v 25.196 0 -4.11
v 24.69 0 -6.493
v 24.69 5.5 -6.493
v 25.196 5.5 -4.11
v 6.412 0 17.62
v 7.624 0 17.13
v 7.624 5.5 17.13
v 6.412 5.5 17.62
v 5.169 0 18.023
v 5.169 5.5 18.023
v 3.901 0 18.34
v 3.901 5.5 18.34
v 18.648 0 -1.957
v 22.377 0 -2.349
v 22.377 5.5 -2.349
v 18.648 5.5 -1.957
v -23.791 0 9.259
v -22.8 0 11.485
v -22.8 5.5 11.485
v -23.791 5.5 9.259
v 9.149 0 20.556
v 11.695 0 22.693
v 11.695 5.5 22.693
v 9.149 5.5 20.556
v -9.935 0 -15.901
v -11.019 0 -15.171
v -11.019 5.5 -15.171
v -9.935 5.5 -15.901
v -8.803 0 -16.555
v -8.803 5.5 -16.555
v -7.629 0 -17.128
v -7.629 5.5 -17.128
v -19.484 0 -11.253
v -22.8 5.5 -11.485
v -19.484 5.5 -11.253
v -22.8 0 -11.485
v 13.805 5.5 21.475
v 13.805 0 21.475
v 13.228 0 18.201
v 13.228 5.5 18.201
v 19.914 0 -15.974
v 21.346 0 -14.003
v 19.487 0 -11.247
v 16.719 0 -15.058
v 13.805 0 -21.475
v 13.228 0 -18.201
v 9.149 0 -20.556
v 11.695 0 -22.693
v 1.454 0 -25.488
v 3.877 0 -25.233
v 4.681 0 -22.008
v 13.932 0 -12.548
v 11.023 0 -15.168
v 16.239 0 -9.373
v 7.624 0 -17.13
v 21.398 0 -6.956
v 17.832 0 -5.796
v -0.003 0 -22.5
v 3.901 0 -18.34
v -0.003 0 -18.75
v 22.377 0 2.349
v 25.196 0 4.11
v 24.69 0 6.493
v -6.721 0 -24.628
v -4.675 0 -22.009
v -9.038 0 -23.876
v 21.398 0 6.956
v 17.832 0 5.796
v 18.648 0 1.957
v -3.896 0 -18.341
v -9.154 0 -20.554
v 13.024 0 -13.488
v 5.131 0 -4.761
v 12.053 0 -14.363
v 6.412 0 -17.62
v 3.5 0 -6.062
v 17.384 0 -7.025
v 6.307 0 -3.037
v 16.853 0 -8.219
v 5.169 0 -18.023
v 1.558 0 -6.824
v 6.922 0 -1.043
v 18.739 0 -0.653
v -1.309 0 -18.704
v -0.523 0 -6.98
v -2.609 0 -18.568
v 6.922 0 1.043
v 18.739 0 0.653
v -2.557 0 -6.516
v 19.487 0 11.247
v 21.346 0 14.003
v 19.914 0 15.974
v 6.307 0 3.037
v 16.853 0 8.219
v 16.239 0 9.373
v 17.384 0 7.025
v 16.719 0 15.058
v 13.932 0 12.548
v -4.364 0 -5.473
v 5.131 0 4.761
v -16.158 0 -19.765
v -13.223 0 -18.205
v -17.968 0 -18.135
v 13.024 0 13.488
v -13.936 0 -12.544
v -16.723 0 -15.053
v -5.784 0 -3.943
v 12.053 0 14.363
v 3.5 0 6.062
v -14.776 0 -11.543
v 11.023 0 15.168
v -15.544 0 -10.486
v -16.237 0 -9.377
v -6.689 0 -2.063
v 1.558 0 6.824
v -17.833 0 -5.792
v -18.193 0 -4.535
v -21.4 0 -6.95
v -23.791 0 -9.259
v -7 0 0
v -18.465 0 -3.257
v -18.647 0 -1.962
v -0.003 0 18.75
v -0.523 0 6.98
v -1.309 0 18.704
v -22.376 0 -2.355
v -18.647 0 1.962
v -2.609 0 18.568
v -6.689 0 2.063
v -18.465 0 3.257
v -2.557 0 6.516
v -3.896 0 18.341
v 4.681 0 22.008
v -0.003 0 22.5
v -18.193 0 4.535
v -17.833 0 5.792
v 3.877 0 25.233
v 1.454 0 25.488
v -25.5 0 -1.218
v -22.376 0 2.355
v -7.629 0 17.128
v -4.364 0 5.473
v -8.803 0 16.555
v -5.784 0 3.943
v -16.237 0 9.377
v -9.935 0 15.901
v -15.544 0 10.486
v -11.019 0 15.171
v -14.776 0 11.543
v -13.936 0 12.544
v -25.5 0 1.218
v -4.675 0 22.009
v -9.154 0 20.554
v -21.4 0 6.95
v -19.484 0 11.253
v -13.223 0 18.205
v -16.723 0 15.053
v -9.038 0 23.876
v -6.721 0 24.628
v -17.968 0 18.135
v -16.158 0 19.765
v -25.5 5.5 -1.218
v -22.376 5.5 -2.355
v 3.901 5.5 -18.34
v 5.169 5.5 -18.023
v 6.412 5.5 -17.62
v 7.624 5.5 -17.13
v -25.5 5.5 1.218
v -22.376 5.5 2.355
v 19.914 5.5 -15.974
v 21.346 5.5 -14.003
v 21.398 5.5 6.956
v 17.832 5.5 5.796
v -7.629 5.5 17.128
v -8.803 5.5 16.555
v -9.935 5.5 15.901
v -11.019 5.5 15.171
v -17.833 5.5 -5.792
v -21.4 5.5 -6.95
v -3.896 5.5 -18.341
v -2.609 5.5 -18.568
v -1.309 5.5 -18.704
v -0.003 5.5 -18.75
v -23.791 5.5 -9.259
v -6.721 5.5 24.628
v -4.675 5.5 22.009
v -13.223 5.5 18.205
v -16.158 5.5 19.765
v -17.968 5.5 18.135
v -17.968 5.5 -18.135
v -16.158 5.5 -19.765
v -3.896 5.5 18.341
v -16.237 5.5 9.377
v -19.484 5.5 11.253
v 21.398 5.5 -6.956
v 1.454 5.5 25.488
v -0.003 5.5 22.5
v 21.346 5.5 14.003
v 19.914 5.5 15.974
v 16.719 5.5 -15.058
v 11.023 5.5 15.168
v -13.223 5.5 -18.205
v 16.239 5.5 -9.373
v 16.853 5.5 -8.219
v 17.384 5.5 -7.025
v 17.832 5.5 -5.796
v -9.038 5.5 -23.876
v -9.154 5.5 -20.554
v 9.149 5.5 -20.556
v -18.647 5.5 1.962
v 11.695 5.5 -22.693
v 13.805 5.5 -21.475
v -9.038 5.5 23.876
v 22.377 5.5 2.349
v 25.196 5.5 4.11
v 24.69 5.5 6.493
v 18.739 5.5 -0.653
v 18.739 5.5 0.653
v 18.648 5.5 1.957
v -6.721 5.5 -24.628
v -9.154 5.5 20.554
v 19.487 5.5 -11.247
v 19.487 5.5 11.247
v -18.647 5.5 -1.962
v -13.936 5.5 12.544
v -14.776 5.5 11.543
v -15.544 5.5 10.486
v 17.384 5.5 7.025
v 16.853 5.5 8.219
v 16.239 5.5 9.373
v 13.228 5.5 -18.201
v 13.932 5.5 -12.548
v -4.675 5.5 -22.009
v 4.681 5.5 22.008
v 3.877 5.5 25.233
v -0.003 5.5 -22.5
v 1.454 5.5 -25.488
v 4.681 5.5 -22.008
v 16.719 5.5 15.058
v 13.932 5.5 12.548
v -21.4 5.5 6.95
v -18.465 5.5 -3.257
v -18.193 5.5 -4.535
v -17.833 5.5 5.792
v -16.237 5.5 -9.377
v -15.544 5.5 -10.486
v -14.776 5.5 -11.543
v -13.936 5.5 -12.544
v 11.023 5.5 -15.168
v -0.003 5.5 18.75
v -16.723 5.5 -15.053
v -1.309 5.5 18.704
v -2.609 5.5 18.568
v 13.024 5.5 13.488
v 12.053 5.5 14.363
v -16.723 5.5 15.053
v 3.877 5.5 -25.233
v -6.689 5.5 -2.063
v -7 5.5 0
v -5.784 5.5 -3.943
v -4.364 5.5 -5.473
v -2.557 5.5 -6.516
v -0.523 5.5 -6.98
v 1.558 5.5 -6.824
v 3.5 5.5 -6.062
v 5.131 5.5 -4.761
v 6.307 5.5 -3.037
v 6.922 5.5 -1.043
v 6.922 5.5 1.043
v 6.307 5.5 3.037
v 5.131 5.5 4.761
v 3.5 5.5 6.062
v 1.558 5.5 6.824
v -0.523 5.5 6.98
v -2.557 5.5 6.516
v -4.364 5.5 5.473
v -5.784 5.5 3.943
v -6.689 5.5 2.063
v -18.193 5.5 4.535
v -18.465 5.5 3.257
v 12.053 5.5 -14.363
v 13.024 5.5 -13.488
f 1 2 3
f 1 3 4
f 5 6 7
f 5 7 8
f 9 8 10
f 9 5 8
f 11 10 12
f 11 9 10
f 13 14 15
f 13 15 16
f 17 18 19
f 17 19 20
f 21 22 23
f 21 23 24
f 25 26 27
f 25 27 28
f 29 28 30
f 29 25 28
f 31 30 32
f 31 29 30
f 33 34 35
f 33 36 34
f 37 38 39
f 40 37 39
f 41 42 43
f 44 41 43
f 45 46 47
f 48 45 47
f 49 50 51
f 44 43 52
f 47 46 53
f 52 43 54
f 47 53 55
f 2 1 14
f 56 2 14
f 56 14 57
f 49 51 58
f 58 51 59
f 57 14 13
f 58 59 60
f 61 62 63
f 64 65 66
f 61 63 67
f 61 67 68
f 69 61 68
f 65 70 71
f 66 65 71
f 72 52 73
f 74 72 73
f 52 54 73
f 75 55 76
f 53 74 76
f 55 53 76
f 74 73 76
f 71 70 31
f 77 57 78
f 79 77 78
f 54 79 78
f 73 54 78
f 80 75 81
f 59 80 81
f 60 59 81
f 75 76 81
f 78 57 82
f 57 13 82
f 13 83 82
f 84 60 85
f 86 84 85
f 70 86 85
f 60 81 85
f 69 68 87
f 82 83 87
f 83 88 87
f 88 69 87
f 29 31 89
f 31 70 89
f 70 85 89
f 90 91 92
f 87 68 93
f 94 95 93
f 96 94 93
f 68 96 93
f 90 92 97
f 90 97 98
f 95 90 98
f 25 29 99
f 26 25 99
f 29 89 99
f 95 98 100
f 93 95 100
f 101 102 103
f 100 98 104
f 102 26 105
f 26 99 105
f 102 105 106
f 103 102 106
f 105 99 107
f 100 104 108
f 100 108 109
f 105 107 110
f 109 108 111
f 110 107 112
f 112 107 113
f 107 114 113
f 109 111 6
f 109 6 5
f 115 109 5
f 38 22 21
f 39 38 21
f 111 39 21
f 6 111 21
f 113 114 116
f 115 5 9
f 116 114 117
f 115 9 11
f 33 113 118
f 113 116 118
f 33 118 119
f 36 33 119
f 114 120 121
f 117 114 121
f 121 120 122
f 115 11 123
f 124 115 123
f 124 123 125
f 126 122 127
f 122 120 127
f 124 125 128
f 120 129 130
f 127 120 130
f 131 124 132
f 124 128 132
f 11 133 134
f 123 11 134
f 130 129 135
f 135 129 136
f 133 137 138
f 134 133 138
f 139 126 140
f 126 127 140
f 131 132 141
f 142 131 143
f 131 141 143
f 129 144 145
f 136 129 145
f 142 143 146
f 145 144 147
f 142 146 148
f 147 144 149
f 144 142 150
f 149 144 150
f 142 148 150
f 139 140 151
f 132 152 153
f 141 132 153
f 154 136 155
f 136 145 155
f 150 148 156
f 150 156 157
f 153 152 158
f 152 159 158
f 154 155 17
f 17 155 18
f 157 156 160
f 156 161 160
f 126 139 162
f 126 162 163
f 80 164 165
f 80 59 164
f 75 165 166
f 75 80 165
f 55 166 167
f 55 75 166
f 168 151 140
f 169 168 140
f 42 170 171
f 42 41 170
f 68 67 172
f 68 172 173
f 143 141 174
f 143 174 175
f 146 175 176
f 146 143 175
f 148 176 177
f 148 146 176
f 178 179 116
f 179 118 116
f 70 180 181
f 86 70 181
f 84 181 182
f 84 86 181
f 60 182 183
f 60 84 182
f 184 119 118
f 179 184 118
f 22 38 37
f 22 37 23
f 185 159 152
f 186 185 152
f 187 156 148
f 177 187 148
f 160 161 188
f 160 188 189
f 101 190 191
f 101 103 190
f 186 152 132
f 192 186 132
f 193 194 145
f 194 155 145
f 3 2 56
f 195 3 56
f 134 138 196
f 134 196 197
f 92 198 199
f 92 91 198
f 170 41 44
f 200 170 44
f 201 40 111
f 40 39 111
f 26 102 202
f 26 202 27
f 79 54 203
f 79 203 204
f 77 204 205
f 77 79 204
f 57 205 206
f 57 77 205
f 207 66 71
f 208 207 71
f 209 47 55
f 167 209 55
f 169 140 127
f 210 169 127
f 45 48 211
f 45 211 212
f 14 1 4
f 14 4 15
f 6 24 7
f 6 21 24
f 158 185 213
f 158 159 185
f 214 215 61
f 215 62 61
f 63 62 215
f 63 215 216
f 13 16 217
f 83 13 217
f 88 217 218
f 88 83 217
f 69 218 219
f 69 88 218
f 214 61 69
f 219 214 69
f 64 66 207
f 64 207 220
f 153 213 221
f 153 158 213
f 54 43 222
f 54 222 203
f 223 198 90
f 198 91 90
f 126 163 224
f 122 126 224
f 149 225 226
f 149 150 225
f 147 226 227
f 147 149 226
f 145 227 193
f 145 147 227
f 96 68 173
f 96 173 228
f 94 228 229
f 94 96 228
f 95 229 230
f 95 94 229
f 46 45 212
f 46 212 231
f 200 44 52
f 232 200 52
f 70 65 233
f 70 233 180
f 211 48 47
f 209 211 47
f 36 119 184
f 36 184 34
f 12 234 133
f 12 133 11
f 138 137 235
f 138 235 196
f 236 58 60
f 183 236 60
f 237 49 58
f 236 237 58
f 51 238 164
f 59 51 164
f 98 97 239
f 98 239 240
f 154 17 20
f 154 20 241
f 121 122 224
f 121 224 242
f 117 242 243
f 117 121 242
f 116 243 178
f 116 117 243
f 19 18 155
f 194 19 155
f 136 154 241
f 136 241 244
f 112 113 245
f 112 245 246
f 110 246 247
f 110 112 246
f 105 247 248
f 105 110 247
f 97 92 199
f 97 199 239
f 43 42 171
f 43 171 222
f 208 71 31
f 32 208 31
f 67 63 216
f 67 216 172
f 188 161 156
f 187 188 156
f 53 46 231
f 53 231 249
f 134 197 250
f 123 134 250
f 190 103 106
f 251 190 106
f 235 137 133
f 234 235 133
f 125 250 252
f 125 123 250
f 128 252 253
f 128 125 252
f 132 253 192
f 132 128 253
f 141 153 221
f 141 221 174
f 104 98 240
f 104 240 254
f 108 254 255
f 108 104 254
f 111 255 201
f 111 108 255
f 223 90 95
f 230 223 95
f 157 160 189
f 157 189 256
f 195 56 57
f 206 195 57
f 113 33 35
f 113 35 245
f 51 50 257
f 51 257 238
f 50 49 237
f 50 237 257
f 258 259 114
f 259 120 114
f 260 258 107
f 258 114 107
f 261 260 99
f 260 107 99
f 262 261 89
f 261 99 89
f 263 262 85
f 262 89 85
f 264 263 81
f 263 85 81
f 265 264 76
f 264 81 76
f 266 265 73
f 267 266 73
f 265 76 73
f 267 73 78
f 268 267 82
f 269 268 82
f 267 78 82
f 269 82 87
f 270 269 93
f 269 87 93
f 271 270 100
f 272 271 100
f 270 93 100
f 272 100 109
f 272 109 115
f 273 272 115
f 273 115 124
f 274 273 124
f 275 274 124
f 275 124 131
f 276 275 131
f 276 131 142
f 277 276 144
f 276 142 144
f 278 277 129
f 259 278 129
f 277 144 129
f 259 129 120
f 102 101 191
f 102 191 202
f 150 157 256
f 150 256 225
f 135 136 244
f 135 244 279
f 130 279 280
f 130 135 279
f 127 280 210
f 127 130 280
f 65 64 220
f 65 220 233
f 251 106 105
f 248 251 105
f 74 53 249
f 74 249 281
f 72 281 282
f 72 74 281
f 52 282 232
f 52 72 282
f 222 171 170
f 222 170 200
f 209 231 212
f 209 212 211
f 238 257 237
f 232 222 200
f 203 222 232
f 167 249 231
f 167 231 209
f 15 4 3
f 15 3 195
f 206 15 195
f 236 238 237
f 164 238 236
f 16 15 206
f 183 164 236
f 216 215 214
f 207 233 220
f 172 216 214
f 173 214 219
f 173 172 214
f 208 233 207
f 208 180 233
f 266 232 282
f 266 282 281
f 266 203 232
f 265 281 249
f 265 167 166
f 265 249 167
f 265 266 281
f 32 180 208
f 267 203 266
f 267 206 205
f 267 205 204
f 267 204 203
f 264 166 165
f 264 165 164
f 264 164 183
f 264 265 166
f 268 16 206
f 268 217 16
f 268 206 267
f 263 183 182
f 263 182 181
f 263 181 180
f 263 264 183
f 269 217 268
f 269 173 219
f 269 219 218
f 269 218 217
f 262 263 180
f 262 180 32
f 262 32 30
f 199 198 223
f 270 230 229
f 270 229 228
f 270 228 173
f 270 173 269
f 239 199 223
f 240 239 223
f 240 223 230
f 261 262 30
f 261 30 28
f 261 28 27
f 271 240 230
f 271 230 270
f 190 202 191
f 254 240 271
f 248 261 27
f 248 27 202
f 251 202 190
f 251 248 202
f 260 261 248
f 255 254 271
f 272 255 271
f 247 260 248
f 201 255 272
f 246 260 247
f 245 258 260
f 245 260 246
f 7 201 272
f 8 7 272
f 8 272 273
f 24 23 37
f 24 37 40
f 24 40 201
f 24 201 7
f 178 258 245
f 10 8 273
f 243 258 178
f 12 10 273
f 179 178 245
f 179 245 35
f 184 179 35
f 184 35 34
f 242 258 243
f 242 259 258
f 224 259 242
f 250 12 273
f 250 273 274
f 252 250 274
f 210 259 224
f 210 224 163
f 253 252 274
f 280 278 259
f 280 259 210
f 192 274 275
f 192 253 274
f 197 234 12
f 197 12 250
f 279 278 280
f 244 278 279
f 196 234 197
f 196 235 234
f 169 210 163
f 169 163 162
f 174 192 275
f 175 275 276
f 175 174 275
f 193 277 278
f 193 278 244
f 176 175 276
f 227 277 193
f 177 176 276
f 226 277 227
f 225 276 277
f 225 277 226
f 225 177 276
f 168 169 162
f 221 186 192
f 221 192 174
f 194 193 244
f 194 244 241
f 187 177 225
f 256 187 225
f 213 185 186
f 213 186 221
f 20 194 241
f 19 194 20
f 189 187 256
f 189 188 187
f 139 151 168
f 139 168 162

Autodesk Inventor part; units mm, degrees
ref_plane "YZ Plane" through (0, 0, 0) normal (1, 0, 0) x (0, 1, 0)
ref_plane "XZ Plane" through (0, 0, 0) normal (0, 1, 0) x (-1, 0, 0)
ref_plane "XY Plane" through (0, 0, 0) normal (0, 0, 1) x (1, 0, 0)
sketch "スケッチ1" plane through (0, 0, 0) normal (0, 1, 0) x (-1, 0, 0)
  circle A0 centre (0, 0) radius 22.5 construction
  circle A1 centre (0, 0) radius 25.5 construction
  line L0 (25.5, 1.2181) -> (25.5, -1.2181)
  line L1 (25.5, 1.2181) -> (22.3764, 2.355)
  line L2 (25.5, -1.2181) -> (22.3764, -2.355)
  line L3 (35.7, 0) -> (-35.7, 0) projected
  circle A2 centre (0, 0) radius 18.75
  line L4 (22.3764, -2.355) -> (18.647, -1.9625)
  line L5 (22.3764, 2.355) -> (18.647, 1.9625)
  line L6 (19.484, 11.2527) -> (16.2367, 9.3773)
  line L7 (22.8, 11.4846) -> (19.484, 11.2527)
  line L8 (22.8, 11.4846) -> (23.7909, 9.259)
  line L9 (23.7909, 9.259) -> (21.3997, 6.9499)
  line L10 (21.3997, 6.9499) -> (17.8331, 5.7916)
  line L11 (13.2226, 18.2047) -> (11.0189, 15.1706)
  line L12 (16.1576, 19.7653) -> (13.2226, 18.2047)
  line L13 (16.1576, 19.7653) -> (17.9681, 18.1351)
  line L14 (17.9681, 18.1351) -> (16.7229, 15.0531)
  line L15 (16.7229, 15.0531) -> (13.9357, 12.5443)
  line L16 (4.675, 22.009) -> (3.8958, 18.3408)
  line L17 (6.7214, 24.6284) -> (4.675, 22.009)
  line L18 (6.7214, 24.6284) -> (9.0384, 23.8755)
  line L19 (9.0384, 23.8755) -> (9.1544, 20.5535)
  line L20 (9.1544, 20.5535) -> (7.6287, 17.1279)
  line L21 (-4.6811, 22.0077) -> (-3.9009, 18.3397)
  line L22 (-3.8769, 25.233) -> (-4.6811, 22.0077)
  line L23 (-3.8769, 25.233) -> (-1.454, 25.4876)
  line L24 (-1.454, 25.4876) -> (0.0031, 22.5)
  line L25 (0.0031, 22.5) -> (0.0026, 18.75)
  line L26 (-13.2277, 18.201) -> (-11.0231, 15.1675)
  line L27 (-13.8049, 21.4746) -> (-13.2277, 18.201)
  line L28 (-13.8049, 21.4746) -> (-11.6951, 22.6927)
  line L29 (-11.6951, 22.6927) -> (-9.1487, 20.556)
  line L30 (-9.1487, 20.556) -> (-7.6239, 17.13)
  line L31 (-19.4871, 11.2473) -> (-16.2393, 9.3727)
  line L32 (-21.3459, 14.0031) -> (-19.4871, 11.2473)
  line L33 (-21.3459, 14.0031) -> (-19.9139, 15.974)
  line L34 (-19.9139, 15.974) -> (-16.7187, 15.0578)
  line L35 (-16.7187, 15.0578) -> (-13.9322, 12.5481)
  line L36 (-22.3771, 2.3488) -> (-18.6476, 1.9573)
  line L37 (-25.196, 4.1103) -> (-22.3771, 2.3488)
  line L38 (-25.196, 4.1103) -> (-24.6895, 6.4932)
  line L39 (-24.6895, 6.4932) -> (-21.3978, 6.9559)
  line L40 (-21.3978, 6.9559) -> (-17.8315, 5.7965)
  line L41 (-21.3978, -6.9559) -> (-17.8315, -5.7965)
  line L42 (-24.6895, -6.4932) -> (-21.3978, -6.9559)
  line L43 (-24.6895, -6.4932) -> (-25.196, -4.1103)
  line L44 (-25.196, -4.1103) -> (-22.3771, -2.3488)
  line L45 (-22.3771, -2.3488) -> (-18.6476, -1.9573)
  line L46 (-16.7187, -15.0578) -> (-13.9322, -12.5481)
  line L47 (-19.9139, -15.974) -> (-16.7187, -15.0578)
  line L48 (-19.9139, -15.974) -> (-21.3459, -14.0031)
  line L49 (-21.3459, -14.0031) -> (-19.4871, -11.2473)
  line L50 (-19.4871, -11.2473) -> (-16.2393, -9.3727)
  line L51 (-9.1487, -20.556) -> (-7.6239, -17.13)
  line L52 (-11.6951, -22.6927) -> (-9.1487, -20.556)
  line L53 (-11.6951, -22.6927) -> (-13.8049, -21.4746)
  line L54 (-13.8049, -21.4746) -> (-13.2277, -18.201)
  line L55 (-13.2277, -18.201) -> (-11.0231, -15.1675)
  line L56 (0.0031, -22.5) -> (0.0026, -18.75)
  line L57 (-1.454, -25.4876) -> (0.0031, -22.5)
  line L58 (-1.454, -25.4876) -> (-3.8769, -25.233)
  line L59 (-3.8769, -25.233) -> (-4.6811, -22.0077)
  line L60 (-4.6811, -22.0077) -> (-3.9009, -18.3397)
  line L61 (9.1544, -20.5535) -> (7.6287, -17.1279)
  line L62 (9.0384, -23.8755) -> (9.1544, -20.5535)
  line L63 (9.0384, -23.8755) -> (6.7214, -24.6284)
  line L64 (6.7214, -24.6284) -> (4.675, -22.009)
  line L65 (4.675, -22.009) -> (3.8958, -18.3408)
  line L66 (16.7229, -15.0531) -> (13.9357, -12.5443)
  line L67 (17.9681, -18.1351) -> (16.7229, -15.0531)
  line L68 (17.9681, -18.1351) -> (16.1576, -19.7653)
  line L69 (16.1576, -19.7653) -> (13.2226, -18.2047)
  line L70 (13.2226, -18.2047) -> (11.0189, -15.1706)
  line L71 (21.3997, -6.9499) -> (17.8331, -5.7916)
  line L72 (23.7909, -9.259) -> (21.3997, -6.9499)
  line L73 (23.7909, -9.259) -> (22.8, -11.4846)
  line L74 (22.8, -11.4846) -> (19.484, -11.2527)
  line L75 (19.484, -11.2527) -> (16.2367, -9.3773)
  circle A3 centre (0, 0) radius 7
  point P0 (25.5, 0)
  point P1 (23.2954, 10.3718)
  point P2 (17.0628, 18.9502)
  point P3 (7.8799, 24.2519)
  point P4 (-2.6655, 25.3603)
  point P5 (-12.75, 22.0836)
  point P6 (-20.6299, 14.9885)
  point P7 (-24.9428, 5.3017)
  point P8 (-24.9428, -5.3017)
  point P9 (-20.6299, -14.9885)
  point P10 (-12.75, -22.0836)
  point P11 (-2.6655, -25.3603)
  point P12 (7.8799, -24.2519)
  point P13 (17.0628, -18.9502)
  point P14 (23.2954, -10.3718)
  point P15 (17.8331, 5.7916)
  point P16 (16.2367, 9.3773)
  point P17 (13.9357, 12.5443)
  point P18 (11.0189, 15.1706)
  point P19 (7.6287, 17.1279)
  point P20 (3.8958, 18.3408)
  point P21 (0.0026, 18.75)
  point P22 (-3.9009, 18.3397)
  point P23 (-7.6239, 17.13)
  point P24 (-11.0231, 15.1675)
  point P25 (-13.9322, 12.5481)
  point P26 (-16.2393, 9.3727)
  point P27 (-17.8315, 5.7965)
  point P28 (-18.6476, 1.9573)
  point P29 (-18.6476, -1.9573)
  point P30 (-17.8315, -5.7965)
  point P31 (-16.2393, -9.3727)
  point P32 (-13.9322, -12.5481)
  point P33 (-11.0231, -15.1675)
  point P34 (-7.6239, -17.13)
  point P35 (-3.9009, -18.3397)
  point P36 (0.0026, -18.75)
  point P37 (3.8958, -18.3408)
  point P38 (7.6287, -17.1279)
  point P39 (11.0189, -15.1706)
  point P40 (13.9357, -12.5443)
  point P41 (16.2367, -9.3773)
  point P42 (17.8331, -5.7916)
  dimension "d5" = 37.5
  dimension "d0" = 45
  dimension "d1" = 51
  dimension "d3" = 20
  dimension "d4" = 20
  dimension "d14" = 4.71
  dimension "d18" = 360
  dimension "d23" = 14
extrude "押し出し1" add sketch "スケッチ1" along normal blind 5.5 contours L0 L3 A2 L5 L1 | L0 L2 L4 A2 L3 | A2 L3 A3 | L3 A3 A2 | A2 L6 L7 L8 L9 L10 | L71 L72 L73 L74 L75 A2 | A2 L11 L12 L13 L14 L15 | L36 L37 L38 L39 L40 A2 | A2 L41 L42 L43 L44 L45 | L66 L67 L68 L69 L70 A2 | A2 L16 L17 L18 L19 L20 | L31 L32 L33 L34 L35 A2 | A2 L46 L47 L48 L49 L50 | L61 L62 L63 L64 L65 A2 | A2 L21 L22 L23 L24 L25 | L26 L27 L28 L29 L30 A2 | A2 L51 L52 L53 L54 L55 | L56 L57 L58 L59 L60 A2
properties part number "M3_15_hole_small" material "木材 (カエデ材)"
